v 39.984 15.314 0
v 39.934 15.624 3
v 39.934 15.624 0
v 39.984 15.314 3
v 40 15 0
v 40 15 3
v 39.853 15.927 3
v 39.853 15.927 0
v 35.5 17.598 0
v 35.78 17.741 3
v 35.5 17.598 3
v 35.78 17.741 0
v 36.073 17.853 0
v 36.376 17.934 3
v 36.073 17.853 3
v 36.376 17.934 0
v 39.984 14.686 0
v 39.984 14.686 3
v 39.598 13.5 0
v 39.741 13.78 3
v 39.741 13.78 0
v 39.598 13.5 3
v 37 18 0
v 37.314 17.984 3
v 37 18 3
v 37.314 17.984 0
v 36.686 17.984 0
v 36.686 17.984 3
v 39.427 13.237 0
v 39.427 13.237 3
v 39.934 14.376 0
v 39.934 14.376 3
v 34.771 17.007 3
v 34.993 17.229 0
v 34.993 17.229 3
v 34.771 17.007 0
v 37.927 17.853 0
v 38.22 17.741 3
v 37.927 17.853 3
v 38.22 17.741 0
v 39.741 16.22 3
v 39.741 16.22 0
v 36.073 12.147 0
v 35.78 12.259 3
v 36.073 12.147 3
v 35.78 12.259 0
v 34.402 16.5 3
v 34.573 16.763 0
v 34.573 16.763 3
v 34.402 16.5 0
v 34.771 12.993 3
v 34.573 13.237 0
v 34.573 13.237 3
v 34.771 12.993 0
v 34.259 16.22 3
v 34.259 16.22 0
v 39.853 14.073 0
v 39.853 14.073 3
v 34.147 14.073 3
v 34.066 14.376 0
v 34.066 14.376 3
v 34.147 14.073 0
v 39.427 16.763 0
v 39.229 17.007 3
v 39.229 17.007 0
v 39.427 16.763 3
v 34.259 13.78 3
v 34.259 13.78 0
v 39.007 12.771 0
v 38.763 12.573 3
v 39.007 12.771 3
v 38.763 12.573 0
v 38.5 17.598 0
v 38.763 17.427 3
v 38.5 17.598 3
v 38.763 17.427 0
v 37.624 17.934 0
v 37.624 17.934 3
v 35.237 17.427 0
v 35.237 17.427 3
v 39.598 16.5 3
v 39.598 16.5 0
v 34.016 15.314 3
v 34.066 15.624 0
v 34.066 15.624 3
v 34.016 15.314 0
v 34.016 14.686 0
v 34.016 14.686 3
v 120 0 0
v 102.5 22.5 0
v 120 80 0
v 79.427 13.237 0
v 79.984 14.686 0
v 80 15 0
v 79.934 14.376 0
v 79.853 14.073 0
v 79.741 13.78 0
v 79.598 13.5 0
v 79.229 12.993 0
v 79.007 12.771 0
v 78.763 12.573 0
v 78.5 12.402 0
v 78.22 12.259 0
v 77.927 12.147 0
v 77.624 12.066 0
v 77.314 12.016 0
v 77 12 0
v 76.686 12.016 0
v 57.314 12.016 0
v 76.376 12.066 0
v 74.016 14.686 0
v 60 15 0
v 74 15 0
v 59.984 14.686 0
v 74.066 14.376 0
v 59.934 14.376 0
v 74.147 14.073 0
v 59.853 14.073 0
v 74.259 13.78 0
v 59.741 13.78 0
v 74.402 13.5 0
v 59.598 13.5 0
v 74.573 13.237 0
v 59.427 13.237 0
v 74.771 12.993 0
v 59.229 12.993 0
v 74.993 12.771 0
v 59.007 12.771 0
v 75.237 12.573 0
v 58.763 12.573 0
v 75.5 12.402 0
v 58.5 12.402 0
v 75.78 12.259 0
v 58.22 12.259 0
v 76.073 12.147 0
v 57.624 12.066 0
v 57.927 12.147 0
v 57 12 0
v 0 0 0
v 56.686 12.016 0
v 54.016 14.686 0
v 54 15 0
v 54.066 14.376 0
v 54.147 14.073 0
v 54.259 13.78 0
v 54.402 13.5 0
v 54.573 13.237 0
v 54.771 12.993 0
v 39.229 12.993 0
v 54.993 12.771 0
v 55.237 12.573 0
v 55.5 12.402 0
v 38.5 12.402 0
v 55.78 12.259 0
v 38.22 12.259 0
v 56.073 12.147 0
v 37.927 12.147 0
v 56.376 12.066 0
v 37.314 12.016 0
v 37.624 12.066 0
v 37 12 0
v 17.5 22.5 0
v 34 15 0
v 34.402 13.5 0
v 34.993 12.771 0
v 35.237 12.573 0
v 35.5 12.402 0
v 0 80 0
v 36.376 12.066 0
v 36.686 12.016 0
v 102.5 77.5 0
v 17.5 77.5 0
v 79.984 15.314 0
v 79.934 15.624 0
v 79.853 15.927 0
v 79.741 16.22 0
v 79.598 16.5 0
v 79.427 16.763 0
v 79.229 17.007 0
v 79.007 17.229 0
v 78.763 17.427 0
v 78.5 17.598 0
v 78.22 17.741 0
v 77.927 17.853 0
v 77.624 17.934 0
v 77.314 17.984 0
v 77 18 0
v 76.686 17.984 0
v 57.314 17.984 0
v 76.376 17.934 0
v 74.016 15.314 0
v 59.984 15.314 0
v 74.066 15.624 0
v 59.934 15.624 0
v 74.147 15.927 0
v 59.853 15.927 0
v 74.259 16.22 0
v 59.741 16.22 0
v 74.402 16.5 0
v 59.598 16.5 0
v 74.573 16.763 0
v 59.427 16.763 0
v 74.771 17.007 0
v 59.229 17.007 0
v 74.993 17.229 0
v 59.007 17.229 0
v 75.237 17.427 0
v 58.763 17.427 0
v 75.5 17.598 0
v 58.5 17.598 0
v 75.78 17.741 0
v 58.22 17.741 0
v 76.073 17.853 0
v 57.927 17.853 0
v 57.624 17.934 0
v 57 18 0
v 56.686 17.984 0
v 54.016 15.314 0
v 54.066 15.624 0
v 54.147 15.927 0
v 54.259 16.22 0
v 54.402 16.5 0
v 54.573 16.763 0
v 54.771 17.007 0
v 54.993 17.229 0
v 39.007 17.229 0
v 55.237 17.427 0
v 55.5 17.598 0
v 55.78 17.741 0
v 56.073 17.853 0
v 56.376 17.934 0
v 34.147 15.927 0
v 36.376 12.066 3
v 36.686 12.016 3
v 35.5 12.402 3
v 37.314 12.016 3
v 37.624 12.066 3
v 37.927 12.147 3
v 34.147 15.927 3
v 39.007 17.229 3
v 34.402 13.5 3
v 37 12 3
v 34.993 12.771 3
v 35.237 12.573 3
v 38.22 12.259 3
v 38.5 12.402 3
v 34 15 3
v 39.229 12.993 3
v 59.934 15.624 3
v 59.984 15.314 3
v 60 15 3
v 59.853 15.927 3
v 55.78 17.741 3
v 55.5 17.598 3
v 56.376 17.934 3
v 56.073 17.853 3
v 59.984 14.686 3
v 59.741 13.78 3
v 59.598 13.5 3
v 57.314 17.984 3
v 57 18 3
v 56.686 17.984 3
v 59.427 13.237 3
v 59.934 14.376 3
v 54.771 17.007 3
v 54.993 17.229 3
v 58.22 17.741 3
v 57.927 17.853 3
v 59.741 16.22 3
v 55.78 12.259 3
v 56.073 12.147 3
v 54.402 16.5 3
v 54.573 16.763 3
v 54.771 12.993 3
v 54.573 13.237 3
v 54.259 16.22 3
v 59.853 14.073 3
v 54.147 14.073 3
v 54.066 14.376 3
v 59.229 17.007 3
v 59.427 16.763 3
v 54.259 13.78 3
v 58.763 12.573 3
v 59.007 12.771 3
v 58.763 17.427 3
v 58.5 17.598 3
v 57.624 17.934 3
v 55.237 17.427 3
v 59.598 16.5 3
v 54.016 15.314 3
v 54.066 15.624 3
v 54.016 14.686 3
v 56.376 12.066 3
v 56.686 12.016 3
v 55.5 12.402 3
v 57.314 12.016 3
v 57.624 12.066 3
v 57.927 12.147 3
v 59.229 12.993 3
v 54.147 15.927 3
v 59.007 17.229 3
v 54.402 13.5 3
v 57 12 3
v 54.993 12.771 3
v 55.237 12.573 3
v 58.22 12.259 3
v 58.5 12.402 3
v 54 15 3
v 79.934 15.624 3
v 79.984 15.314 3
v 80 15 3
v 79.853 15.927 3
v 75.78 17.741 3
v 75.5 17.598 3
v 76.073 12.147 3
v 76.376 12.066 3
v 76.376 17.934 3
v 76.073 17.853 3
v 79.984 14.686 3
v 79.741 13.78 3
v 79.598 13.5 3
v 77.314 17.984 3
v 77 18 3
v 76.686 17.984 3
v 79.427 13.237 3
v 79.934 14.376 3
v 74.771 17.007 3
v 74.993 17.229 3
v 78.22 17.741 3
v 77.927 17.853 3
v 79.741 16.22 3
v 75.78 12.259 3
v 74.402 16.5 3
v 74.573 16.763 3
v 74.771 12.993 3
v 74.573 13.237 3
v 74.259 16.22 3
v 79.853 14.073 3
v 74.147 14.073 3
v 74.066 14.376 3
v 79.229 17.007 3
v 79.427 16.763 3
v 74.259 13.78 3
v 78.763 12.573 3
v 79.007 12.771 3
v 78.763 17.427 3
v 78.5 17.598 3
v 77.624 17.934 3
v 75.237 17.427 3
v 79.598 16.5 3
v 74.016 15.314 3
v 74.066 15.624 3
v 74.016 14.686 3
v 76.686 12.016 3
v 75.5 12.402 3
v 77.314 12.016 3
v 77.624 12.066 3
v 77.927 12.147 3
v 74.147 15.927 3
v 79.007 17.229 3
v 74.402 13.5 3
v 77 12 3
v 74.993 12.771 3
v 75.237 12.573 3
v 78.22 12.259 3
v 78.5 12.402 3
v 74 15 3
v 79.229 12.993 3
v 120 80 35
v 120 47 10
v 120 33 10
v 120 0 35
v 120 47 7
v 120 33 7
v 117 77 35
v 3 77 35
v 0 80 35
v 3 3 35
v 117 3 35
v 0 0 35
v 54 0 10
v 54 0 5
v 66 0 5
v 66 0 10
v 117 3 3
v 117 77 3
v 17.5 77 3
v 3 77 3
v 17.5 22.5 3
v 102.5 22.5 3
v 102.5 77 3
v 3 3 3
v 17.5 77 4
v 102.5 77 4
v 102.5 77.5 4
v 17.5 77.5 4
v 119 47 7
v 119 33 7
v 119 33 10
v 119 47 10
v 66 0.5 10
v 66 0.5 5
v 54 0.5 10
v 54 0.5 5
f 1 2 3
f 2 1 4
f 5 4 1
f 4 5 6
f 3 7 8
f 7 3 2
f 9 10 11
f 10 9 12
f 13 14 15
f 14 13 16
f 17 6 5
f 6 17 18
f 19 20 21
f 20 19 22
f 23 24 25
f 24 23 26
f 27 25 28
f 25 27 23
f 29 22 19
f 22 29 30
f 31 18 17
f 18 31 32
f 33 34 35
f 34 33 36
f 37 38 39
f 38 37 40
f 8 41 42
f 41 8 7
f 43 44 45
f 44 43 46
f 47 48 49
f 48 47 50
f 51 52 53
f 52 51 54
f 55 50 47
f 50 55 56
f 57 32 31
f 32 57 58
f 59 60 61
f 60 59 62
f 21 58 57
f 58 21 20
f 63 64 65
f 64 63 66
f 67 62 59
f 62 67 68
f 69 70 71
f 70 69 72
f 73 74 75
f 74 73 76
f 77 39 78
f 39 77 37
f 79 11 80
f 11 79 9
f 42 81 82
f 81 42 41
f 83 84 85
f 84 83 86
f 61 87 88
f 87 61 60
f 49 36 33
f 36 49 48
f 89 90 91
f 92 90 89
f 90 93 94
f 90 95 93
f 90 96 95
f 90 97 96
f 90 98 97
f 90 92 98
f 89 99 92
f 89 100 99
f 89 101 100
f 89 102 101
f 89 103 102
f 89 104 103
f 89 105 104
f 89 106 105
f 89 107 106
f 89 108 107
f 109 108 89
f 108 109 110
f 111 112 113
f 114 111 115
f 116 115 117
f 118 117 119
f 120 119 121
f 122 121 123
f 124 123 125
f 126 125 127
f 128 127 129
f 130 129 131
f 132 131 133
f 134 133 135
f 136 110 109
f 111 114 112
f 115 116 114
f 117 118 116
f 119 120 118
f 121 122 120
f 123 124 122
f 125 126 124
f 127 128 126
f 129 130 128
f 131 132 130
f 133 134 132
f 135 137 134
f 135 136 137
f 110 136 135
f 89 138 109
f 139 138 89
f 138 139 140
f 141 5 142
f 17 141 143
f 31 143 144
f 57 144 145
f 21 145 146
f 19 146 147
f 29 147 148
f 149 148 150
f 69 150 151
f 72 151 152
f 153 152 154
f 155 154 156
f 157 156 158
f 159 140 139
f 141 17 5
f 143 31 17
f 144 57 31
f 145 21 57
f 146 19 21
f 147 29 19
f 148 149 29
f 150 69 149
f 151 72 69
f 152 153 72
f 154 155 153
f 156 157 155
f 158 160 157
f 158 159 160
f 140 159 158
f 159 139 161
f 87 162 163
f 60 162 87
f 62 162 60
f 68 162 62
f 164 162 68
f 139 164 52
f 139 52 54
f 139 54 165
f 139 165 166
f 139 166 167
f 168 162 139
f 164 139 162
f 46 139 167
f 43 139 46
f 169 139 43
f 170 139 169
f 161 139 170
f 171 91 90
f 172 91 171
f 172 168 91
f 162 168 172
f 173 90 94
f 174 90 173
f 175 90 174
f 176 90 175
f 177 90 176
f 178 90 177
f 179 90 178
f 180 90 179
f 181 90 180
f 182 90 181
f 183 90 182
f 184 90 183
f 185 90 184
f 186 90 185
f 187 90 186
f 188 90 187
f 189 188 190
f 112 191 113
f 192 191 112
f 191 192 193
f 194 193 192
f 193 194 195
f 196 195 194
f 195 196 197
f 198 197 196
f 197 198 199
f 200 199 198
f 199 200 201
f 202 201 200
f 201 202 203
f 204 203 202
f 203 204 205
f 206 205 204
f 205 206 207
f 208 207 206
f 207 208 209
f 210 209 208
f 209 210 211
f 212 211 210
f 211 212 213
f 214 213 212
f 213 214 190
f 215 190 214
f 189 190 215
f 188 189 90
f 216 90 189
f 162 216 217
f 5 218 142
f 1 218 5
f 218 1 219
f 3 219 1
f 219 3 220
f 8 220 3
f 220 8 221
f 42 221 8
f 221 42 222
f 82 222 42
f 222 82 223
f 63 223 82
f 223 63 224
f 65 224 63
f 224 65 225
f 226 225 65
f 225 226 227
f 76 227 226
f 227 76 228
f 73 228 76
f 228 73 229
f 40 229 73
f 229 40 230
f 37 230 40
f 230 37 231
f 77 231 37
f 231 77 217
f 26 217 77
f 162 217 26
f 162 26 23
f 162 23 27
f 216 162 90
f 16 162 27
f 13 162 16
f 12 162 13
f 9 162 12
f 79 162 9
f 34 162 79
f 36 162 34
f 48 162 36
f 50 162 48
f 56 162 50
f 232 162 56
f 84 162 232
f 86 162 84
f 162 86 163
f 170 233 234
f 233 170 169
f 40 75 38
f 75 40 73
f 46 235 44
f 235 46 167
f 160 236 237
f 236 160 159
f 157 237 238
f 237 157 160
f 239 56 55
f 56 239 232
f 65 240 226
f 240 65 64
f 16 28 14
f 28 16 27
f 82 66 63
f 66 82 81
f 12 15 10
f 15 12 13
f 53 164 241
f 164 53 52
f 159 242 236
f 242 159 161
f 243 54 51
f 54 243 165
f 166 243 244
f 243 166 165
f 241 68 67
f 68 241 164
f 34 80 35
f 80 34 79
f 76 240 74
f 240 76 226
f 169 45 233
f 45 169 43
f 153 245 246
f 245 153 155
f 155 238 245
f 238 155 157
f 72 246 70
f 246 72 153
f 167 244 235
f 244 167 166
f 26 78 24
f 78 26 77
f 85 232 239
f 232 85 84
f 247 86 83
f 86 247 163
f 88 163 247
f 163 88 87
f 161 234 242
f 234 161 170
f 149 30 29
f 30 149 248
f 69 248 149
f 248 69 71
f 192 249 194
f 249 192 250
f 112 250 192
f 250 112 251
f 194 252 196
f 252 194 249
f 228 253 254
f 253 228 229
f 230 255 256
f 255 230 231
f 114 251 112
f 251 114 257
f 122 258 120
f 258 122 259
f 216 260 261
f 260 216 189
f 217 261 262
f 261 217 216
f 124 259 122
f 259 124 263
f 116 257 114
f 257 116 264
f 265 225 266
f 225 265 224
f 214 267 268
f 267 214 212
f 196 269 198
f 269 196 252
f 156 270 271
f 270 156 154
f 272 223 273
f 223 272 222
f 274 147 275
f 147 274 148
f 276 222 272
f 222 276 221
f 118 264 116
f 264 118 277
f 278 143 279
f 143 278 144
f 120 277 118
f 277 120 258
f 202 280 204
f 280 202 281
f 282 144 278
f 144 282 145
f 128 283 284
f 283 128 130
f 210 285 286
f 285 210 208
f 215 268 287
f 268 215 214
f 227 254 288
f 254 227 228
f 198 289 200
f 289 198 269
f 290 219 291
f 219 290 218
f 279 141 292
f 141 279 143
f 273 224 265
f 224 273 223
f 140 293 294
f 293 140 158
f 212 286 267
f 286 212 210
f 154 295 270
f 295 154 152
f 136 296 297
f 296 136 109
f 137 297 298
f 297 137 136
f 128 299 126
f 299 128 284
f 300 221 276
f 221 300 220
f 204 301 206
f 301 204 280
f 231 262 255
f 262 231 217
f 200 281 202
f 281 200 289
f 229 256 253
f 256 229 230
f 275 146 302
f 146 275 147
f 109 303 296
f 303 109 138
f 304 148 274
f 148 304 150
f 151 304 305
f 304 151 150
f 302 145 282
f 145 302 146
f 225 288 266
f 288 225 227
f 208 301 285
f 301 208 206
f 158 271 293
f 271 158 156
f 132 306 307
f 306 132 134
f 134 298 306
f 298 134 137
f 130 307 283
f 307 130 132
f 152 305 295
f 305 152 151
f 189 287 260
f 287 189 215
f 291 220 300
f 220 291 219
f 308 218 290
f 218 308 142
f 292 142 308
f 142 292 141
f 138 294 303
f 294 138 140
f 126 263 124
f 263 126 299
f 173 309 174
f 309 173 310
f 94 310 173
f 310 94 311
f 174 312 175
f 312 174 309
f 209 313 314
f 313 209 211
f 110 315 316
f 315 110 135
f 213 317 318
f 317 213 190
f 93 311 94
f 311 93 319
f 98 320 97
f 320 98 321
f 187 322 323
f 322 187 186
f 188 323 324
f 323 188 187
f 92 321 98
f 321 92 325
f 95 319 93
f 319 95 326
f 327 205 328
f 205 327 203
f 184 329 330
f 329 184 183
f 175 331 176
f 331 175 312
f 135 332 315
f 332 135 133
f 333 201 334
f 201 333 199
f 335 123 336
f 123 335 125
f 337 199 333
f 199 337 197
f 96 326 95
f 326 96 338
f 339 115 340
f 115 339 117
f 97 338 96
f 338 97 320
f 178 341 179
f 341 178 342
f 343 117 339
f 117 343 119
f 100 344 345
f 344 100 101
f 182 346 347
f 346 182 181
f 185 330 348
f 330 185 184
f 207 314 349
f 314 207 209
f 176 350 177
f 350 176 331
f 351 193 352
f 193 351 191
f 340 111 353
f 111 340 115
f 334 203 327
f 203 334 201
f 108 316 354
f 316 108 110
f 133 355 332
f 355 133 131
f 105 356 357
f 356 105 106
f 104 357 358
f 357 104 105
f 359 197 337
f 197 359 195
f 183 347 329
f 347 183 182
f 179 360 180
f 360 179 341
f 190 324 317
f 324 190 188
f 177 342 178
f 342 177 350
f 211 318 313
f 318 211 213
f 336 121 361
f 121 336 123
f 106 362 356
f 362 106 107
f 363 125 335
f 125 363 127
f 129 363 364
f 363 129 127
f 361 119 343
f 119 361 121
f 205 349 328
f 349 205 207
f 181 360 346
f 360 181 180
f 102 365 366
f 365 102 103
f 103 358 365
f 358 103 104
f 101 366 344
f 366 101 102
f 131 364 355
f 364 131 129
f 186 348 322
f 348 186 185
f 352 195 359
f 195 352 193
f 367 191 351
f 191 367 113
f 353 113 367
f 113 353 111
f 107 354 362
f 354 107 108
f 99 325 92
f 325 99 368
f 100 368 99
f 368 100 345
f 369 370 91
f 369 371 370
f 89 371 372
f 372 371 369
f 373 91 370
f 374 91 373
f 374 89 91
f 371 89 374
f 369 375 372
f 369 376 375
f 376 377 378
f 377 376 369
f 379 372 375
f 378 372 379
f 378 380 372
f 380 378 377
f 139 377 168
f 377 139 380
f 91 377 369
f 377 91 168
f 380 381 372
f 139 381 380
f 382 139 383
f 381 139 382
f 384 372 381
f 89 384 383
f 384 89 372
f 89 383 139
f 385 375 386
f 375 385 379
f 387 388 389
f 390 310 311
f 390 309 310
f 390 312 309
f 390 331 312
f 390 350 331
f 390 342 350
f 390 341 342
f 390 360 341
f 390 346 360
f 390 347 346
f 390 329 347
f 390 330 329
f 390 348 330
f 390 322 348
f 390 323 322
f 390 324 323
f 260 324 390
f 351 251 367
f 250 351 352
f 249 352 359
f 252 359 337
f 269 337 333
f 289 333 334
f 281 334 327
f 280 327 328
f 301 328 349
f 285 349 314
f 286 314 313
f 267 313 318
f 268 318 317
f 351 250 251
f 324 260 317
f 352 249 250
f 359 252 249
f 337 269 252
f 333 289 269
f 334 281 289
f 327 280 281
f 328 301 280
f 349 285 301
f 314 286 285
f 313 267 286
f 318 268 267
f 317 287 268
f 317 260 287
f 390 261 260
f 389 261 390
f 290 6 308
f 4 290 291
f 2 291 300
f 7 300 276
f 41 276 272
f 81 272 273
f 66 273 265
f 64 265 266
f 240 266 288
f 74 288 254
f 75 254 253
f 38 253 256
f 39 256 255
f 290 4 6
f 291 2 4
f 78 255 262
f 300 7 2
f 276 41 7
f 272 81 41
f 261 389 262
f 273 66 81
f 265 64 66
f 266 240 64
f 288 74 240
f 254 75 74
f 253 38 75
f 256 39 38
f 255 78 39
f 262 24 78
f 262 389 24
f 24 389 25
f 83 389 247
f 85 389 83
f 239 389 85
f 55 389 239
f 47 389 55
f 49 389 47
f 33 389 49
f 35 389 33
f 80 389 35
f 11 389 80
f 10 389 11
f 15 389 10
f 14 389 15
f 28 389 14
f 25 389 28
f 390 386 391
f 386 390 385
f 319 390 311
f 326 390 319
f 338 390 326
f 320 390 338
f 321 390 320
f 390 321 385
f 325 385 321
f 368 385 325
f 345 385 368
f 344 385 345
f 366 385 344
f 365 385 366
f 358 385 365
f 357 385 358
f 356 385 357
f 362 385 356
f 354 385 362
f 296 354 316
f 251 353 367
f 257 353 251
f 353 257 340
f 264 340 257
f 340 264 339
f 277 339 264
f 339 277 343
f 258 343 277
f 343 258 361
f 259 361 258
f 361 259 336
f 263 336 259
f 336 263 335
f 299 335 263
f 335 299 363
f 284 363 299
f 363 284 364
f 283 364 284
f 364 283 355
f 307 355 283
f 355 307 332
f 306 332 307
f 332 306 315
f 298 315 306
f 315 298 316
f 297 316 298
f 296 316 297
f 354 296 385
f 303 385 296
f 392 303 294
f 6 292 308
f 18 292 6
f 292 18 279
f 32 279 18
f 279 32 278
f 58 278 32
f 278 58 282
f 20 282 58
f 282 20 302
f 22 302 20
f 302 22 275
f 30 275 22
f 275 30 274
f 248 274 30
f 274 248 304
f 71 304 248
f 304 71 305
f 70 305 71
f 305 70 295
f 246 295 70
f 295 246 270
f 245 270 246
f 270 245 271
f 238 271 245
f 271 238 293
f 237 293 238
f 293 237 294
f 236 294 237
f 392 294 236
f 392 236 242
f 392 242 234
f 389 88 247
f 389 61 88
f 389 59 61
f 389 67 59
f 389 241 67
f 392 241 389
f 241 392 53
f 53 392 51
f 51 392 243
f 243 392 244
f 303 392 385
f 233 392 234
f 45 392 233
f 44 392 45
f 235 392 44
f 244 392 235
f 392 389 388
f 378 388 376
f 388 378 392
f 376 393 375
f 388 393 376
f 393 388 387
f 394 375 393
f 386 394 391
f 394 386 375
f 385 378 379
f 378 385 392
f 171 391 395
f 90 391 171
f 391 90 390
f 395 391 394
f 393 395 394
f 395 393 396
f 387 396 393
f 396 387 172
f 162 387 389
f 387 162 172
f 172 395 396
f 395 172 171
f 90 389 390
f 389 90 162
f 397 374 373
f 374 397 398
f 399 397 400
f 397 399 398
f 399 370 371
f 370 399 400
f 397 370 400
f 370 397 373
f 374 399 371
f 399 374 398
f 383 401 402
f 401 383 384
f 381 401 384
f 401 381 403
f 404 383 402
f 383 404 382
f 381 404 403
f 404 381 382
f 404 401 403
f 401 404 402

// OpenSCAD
// Dépressiomètre ESP32 - Boîtier OpenSCAD
// Auteur : Copilot
// Écran TFT 3.5" ILI9488, ESP32-S3, boutons, SD, USB, inserts filetés

$fn = 60;

// Dimensions générales
boitier_largeur = 120;
boitier_hauteur = 80;
boitier_profondeur = 35;
epaisseur_paroi = 3;

// Découpe écran (centré)
ecran_largeur = 85;
ecran_hauteur = 55;
ecran_profondeur = 3;

// Boutons (3 sous l'écran)
bouton_diametre = 6;
bouton_espacement = 20;
bouton_y = 15;

// Fente carte SD (côté droit)
sd_largeur = 14;
sd_hauteur = 3;

// USB (dessous)
usb_largeur = 12;
usb_hauteur = 5;

// Inserts filetés (coins)
insert_diametre = 4;
insert_offset = 6;

module boitier() {
    difference() {
        // Boîtier principal
        cube([boitier_largeur, boitier_hauteur, boitier_profondeur]);

        // Creux intérieur
        translate([epaisseur_paroi, epaisseur_paroi, epaisseur_paroi])
            cube([boitier_largeur - 2*epaisseur_paroi,
                  boitier_hauteur - 2*epaisseur_paroi,
                  boitier_profondeur]);

        // Découpe écran
        translate([(boitier_largeur - ecran_largeur)/2,
                   (boitier_hauteur - ecran_hauteur)/2 + 10,
                   0])
            cube([ecran_largeur, ecran_hauteur, ecran_profondeur + 1]);

        // Boutons
        for (i = [-1, 0, 1]) {
            translate([(boitier_largeur/2) + i*bouton_espacement - bouton_diametre/2,
                       bouton_y,
                       0])
                cylinder(h = 5, d = bouton_diametre);
        }

        // Fente carte SD (côté droit)
        translate([boitier_largeur - 1,
                   boitier_hauteur/2 - sd_largeur/2,
                   10])
            rotate([0,90,0])
                cube([sd_hauteur, sd_largeur, 10]);

        // USB (dessous)
        translate([boitier_largeur/2 - usb_largeur/2,
                   -1,
                   5])
            cube([usb_largeur, 1.5, usb_hauteur]);

        // Inserts filetés (4 coins)
        for (x = [insert_offset, boitier_largeur - insert_offset])
            for (y = [insert_offset, boitier_hauteur - insert_offset])
                translate([x, y, boitier_profondeur - 5])
                    cylinder(h = 6, d = insert_diametre);
    }
}

boitier();
